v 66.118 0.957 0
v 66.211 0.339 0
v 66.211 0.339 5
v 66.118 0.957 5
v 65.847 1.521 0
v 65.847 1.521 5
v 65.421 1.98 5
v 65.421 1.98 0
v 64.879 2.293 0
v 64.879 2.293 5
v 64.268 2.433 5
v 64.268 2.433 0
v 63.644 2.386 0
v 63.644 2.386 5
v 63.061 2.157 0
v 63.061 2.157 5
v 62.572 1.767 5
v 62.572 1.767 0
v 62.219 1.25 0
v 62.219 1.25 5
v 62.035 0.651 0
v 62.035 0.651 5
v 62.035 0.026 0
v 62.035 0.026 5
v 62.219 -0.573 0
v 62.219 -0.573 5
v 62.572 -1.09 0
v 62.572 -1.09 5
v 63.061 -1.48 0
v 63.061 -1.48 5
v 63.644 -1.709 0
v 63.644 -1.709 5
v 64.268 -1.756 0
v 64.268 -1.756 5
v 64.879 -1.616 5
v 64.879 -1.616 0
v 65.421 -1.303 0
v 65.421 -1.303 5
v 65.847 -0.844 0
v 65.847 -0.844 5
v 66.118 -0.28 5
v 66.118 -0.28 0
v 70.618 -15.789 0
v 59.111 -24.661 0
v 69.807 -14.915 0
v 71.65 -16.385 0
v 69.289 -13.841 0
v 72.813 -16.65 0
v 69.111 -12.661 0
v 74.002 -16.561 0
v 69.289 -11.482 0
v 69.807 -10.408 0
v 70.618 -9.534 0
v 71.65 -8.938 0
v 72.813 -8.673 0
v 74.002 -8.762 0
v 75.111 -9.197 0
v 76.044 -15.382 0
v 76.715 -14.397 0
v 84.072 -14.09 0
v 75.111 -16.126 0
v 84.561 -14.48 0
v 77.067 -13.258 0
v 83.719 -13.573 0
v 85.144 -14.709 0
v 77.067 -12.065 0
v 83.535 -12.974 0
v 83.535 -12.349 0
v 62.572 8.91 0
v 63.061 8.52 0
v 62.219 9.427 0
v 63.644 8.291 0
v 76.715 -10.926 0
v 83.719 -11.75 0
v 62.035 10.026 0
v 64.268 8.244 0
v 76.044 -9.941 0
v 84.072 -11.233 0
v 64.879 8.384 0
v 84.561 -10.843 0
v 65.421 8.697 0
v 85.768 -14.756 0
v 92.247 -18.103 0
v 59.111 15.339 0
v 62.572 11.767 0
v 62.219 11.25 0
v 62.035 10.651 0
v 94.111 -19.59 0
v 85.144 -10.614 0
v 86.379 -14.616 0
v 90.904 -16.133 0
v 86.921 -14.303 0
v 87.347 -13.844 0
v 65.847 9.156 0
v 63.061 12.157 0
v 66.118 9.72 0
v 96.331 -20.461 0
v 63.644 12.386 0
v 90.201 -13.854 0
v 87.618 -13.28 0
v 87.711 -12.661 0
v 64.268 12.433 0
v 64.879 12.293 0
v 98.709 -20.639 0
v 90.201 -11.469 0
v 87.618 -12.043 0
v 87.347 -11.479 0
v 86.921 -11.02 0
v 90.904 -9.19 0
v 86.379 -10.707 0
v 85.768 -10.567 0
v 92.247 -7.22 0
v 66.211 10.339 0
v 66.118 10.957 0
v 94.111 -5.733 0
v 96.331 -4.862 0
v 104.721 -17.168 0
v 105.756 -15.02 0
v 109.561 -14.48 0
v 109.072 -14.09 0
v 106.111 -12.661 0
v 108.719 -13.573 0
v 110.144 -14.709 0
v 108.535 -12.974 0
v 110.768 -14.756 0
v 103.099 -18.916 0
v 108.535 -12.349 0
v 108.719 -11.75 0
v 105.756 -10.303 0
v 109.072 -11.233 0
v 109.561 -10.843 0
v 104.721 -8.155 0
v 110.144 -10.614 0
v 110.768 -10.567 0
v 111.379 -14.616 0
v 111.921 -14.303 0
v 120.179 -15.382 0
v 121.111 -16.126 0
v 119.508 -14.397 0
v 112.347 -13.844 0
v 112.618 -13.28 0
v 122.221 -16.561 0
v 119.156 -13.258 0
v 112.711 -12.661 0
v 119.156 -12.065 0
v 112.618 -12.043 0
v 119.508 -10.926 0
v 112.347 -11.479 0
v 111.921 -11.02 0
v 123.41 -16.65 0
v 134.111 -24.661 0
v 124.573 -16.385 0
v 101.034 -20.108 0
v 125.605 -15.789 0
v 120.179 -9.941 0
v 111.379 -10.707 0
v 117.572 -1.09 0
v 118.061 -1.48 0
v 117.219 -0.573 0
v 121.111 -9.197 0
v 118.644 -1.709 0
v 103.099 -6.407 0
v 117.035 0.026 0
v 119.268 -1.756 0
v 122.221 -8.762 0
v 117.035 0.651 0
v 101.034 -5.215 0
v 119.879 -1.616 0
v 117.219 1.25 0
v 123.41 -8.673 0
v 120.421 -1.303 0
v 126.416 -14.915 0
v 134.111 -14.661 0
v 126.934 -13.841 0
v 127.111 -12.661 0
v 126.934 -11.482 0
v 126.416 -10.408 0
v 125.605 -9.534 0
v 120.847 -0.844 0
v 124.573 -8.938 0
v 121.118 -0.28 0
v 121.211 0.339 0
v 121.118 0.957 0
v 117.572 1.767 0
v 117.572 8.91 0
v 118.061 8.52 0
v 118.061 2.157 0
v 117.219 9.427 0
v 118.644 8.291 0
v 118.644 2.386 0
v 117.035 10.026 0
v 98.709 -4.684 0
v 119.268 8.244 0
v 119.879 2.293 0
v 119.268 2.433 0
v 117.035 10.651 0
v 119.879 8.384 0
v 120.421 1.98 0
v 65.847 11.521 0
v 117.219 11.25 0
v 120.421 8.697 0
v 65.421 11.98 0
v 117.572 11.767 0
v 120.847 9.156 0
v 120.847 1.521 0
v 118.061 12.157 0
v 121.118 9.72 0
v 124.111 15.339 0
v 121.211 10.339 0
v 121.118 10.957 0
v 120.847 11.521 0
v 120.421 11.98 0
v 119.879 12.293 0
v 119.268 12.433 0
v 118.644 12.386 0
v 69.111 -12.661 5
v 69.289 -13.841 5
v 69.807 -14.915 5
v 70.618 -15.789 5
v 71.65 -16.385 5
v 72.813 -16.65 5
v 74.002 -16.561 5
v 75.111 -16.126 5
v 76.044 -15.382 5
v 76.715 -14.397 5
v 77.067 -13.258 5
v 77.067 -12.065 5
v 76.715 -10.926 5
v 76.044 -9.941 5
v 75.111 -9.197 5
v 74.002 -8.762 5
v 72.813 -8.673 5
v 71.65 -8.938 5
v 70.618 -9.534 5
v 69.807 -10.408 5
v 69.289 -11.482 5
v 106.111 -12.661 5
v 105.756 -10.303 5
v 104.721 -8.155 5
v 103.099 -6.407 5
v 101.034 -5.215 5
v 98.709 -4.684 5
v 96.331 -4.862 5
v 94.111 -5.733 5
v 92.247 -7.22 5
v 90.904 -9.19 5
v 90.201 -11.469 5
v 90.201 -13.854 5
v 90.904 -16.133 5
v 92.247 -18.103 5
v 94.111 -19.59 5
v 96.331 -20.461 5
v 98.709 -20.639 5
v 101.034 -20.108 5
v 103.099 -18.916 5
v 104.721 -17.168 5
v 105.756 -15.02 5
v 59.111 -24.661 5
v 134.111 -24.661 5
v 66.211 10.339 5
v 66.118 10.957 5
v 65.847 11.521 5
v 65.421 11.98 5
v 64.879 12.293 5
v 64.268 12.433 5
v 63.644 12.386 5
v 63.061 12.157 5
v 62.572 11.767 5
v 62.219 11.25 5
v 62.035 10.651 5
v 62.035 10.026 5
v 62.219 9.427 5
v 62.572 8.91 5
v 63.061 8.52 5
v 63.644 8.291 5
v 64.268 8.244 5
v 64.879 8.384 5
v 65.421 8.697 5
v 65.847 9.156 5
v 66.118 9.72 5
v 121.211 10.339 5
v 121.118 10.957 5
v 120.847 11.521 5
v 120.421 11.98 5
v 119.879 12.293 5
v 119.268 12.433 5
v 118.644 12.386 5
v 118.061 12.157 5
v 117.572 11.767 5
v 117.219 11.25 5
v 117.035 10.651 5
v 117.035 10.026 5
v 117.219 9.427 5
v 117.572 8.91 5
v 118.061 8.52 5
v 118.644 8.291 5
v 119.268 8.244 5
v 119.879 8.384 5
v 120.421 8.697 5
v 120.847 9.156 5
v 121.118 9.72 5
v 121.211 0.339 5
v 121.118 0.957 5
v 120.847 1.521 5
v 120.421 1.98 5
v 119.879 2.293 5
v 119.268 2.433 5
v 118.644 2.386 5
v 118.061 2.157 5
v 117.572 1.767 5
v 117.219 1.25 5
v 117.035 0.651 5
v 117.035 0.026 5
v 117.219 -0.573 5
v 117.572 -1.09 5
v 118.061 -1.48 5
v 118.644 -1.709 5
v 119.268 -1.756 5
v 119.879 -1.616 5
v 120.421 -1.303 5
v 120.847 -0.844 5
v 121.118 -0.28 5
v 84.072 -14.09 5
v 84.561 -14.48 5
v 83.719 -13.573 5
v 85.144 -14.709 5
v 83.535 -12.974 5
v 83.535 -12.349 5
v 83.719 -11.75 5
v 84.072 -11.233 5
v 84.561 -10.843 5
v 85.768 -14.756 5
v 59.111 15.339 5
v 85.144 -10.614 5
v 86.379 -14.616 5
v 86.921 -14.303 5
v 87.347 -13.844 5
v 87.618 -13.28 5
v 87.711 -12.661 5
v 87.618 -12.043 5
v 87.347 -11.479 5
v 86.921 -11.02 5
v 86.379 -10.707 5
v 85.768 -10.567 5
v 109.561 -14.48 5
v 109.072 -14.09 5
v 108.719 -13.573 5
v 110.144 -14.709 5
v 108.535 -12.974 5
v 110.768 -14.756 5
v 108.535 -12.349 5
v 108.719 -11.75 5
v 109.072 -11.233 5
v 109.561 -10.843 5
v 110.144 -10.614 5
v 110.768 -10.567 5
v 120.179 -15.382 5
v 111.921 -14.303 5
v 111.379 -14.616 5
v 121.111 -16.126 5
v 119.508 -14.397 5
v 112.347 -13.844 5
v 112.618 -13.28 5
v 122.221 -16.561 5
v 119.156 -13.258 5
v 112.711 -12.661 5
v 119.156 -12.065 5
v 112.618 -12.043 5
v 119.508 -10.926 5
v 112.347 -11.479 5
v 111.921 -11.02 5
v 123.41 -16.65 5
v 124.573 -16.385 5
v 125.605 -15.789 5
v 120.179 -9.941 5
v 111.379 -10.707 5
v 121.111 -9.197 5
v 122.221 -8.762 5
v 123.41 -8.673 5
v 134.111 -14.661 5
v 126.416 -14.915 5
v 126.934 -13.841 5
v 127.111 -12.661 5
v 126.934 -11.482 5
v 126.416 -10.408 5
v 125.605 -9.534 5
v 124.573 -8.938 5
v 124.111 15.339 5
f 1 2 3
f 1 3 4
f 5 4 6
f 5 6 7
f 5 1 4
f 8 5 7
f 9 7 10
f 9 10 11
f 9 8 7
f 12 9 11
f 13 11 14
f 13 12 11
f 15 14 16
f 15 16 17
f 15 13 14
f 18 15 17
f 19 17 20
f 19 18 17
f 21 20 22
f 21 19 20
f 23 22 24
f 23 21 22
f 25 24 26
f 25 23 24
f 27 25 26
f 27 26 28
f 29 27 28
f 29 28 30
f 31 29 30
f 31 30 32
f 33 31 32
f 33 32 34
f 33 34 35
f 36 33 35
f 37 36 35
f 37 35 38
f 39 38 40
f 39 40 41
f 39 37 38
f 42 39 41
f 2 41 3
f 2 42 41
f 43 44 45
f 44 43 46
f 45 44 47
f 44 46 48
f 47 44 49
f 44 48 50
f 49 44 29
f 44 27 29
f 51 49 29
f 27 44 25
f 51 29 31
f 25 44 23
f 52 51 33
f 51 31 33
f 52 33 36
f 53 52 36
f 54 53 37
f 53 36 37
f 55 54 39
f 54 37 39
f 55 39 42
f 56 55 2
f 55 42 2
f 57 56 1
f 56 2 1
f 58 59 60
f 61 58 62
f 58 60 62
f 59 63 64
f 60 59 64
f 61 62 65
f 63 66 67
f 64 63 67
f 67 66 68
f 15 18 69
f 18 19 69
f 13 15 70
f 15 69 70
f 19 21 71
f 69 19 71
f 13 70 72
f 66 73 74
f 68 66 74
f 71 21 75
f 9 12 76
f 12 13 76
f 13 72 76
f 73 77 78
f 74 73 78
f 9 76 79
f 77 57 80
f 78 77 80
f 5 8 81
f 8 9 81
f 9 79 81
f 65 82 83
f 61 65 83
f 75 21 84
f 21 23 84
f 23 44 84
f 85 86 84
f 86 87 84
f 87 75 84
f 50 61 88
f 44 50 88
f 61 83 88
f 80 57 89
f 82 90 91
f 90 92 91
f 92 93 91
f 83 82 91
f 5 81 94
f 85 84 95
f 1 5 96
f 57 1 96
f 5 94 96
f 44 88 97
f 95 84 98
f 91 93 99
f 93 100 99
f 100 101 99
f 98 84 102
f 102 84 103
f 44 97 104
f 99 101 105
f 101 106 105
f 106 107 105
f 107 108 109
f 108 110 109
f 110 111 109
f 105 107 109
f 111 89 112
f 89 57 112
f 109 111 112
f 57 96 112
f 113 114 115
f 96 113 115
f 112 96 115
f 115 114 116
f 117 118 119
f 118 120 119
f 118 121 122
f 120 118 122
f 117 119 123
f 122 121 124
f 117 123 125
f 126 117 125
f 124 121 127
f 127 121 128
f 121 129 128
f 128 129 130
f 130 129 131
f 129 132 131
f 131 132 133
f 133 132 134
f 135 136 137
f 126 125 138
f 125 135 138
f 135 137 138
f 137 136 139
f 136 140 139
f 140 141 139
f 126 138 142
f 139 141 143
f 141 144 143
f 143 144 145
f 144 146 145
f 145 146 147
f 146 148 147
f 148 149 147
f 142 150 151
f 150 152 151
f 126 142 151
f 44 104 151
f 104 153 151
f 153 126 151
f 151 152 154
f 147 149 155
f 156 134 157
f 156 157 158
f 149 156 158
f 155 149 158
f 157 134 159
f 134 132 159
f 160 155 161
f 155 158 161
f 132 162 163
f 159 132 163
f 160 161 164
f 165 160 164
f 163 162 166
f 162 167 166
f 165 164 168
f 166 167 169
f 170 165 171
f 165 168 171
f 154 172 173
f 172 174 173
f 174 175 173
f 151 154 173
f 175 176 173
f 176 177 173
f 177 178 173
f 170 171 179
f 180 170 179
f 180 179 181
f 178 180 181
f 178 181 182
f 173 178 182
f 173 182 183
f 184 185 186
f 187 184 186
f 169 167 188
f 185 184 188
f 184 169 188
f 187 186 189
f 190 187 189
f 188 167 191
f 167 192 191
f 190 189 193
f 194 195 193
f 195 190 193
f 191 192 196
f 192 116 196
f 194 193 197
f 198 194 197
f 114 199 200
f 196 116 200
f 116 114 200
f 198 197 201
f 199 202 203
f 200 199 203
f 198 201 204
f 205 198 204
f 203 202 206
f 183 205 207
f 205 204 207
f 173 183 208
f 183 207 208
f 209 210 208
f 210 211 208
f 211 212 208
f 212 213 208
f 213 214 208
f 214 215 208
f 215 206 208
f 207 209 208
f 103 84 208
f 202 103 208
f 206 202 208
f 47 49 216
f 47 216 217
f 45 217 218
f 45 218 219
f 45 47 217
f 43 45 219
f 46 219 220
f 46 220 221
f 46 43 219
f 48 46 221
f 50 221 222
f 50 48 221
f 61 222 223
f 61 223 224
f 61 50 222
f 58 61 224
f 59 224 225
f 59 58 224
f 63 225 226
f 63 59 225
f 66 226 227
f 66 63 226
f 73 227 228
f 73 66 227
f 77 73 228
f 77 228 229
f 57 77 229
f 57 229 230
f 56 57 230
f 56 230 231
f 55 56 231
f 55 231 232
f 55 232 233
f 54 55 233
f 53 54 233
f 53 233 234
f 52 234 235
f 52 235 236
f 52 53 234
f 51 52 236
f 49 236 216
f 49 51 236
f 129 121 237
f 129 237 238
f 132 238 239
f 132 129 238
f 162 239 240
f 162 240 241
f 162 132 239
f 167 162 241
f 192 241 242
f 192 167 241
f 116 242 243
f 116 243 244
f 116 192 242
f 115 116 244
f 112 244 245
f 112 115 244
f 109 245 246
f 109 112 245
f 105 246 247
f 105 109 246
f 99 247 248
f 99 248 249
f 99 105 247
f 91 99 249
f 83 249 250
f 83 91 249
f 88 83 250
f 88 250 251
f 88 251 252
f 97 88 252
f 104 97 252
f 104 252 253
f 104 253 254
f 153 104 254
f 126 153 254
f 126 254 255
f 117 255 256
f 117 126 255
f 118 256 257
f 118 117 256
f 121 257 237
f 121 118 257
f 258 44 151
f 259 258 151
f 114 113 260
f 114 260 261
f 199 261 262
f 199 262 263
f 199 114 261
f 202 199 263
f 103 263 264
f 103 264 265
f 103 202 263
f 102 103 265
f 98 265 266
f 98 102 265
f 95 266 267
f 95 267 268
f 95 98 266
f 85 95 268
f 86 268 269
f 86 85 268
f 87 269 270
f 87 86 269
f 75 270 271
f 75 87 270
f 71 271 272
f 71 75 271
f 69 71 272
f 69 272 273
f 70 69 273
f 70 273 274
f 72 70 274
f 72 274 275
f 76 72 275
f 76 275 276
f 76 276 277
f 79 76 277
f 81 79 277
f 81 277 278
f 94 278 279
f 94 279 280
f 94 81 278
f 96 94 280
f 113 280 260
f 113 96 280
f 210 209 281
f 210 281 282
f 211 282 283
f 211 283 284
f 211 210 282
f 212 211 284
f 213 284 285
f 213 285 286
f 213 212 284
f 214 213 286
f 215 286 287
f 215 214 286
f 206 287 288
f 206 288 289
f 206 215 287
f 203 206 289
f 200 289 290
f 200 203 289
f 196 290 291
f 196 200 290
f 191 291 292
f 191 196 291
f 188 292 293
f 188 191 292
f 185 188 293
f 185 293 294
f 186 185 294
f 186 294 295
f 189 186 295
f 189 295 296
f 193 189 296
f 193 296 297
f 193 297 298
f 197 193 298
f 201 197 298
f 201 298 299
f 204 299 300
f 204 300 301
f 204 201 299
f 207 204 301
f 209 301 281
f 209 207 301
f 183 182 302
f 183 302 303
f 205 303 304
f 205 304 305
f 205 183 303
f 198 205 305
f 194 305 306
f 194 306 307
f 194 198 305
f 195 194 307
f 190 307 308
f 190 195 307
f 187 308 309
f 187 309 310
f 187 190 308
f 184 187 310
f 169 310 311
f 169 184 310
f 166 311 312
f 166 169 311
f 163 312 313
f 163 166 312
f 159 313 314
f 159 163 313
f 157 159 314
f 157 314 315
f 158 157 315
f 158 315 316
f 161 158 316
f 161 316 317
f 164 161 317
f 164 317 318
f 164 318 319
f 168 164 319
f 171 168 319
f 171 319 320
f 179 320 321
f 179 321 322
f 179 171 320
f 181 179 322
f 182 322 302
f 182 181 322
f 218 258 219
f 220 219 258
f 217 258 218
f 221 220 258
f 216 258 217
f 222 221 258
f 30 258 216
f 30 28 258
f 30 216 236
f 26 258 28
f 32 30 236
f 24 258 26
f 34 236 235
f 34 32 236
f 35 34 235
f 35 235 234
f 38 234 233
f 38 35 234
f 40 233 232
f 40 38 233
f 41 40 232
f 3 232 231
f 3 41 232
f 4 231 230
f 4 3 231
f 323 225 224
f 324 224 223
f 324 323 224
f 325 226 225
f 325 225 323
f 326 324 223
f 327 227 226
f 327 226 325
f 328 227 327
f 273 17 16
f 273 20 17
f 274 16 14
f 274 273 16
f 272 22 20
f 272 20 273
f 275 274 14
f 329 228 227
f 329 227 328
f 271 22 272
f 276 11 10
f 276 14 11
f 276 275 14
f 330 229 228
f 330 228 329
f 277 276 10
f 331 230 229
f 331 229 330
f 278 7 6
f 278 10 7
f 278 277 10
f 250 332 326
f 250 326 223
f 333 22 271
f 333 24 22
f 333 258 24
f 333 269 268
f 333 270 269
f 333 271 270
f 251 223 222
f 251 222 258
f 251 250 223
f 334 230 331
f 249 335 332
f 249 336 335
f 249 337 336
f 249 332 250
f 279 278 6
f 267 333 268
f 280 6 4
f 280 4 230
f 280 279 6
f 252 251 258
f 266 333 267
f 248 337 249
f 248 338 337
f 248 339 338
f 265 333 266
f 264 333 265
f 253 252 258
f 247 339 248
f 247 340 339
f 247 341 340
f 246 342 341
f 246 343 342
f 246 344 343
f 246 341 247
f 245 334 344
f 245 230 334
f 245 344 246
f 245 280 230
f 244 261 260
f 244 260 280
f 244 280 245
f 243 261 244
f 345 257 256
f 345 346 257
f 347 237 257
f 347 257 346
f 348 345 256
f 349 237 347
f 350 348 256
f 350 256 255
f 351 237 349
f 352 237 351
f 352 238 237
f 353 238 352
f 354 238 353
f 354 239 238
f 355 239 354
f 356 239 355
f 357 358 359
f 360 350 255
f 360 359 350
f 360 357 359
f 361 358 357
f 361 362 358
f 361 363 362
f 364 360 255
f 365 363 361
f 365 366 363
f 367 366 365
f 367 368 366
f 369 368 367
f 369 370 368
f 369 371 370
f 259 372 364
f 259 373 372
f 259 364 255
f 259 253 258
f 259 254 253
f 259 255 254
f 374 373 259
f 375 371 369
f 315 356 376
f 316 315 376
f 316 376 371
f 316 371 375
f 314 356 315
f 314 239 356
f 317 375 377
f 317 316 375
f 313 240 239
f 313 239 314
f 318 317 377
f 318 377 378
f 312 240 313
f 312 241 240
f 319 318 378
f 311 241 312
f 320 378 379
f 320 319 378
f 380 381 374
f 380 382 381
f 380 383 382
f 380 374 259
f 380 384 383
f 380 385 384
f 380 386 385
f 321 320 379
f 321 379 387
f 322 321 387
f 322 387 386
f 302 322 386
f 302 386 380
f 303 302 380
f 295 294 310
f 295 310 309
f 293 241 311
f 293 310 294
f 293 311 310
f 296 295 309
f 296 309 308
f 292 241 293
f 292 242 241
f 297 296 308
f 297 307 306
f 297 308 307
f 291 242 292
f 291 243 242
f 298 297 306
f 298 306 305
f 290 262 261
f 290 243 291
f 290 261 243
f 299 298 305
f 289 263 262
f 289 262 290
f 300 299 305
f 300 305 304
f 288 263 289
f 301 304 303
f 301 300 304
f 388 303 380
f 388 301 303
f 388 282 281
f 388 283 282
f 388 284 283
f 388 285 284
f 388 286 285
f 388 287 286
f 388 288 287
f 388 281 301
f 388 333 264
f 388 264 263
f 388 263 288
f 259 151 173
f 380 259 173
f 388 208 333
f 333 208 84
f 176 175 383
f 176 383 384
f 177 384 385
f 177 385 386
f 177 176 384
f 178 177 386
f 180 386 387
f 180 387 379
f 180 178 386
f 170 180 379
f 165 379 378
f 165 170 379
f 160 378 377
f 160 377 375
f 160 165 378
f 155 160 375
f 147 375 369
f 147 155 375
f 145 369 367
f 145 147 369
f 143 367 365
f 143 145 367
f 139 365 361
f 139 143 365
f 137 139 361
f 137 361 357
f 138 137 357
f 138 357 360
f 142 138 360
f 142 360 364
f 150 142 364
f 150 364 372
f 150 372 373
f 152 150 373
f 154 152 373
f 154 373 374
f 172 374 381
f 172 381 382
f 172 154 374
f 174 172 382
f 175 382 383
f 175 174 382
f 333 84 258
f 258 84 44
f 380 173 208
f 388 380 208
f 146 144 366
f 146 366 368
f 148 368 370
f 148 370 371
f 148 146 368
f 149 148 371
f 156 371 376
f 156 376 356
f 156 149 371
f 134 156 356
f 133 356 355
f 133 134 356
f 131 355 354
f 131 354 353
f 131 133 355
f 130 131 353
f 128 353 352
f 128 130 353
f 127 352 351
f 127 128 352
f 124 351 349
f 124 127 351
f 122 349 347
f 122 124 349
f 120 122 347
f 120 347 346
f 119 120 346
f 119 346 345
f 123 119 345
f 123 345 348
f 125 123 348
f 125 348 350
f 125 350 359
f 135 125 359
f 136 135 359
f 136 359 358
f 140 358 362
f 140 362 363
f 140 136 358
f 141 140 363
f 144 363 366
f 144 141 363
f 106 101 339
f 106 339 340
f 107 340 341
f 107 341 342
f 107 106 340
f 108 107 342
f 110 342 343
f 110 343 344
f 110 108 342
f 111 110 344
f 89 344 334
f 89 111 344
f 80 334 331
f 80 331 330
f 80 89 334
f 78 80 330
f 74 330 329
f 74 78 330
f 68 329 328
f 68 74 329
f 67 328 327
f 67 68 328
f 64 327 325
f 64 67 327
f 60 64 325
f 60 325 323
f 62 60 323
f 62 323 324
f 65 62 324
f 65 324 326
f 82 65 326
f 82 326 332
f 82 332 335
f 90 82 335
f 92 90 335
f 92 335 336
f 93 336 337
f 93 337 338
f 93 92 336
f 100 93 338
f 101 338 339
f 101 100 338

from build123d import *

# Parameters (mm, degrees)
SKETCH1_R           = 2.1
SKETCH1_R_2         = 4
SKETCH1_R_3         = 8
BOSS_EXTRUDE1_DEPTH = 5


with BuildPart() as part:
    # Sketch1 → Boss-Extrude1 (new body)
    with BuildSketch(Plane.XY):
        Polygon((124.111470678, 15.338509317), (59.111470678, 15.338509317), (59.111470678, -6.661490683), (59.111470678, -24.661490683), (124.111470678, -24.661490683), (134.111470678, -24.661490683), (134.111470678, -14.661490683), align=None)
        with Locations((64.111470678, 10.338509317)):
            Circle(SKETCH1_R, mode=Mode.SUBTRACT)
        with Locations((119.111470678, 10.338509317)):
            Circle(SKETCH1_R, mode=Mode.SUBTRACT)
        with Locations((64.111470678, 0.338509317)):
            Circle(SKETCH1_R, mode=Mode.SUBTRACT)
        with Locations((119.111470678, 0.338509317)):
            Circle(SKETCH1_R, mode=Mode.SUBTRACT)
        with Locations((123.111470678, -12.661490683)):
            Circle(SKETCH1_R_2, mode=Mode.SUBTRACT)
        with Locations((98.111470678, -12.661490683)):
            Circle(SKETCH1_R_3, mode=Mode.SUBTRACT)
        with Locations((85.611470678, -12.661490683)):
            Circle(SKETCH1_R, mode=Mode.SUBTRACT)
        with Locations((110.611470678, -12.661490683)):
            Circle(SKETCH1_R, mode=Mode.SUBTRACT)
        with Locations(Location((73.111470678, -12.661490683, 0), (0, 0, 180))):
            Circle(SKETCH1_R_2, mode=Mode.SUBTRACT)
    extrude(amount=BOSS_EXTRUDE1_DEPTH)


solid = part.part
